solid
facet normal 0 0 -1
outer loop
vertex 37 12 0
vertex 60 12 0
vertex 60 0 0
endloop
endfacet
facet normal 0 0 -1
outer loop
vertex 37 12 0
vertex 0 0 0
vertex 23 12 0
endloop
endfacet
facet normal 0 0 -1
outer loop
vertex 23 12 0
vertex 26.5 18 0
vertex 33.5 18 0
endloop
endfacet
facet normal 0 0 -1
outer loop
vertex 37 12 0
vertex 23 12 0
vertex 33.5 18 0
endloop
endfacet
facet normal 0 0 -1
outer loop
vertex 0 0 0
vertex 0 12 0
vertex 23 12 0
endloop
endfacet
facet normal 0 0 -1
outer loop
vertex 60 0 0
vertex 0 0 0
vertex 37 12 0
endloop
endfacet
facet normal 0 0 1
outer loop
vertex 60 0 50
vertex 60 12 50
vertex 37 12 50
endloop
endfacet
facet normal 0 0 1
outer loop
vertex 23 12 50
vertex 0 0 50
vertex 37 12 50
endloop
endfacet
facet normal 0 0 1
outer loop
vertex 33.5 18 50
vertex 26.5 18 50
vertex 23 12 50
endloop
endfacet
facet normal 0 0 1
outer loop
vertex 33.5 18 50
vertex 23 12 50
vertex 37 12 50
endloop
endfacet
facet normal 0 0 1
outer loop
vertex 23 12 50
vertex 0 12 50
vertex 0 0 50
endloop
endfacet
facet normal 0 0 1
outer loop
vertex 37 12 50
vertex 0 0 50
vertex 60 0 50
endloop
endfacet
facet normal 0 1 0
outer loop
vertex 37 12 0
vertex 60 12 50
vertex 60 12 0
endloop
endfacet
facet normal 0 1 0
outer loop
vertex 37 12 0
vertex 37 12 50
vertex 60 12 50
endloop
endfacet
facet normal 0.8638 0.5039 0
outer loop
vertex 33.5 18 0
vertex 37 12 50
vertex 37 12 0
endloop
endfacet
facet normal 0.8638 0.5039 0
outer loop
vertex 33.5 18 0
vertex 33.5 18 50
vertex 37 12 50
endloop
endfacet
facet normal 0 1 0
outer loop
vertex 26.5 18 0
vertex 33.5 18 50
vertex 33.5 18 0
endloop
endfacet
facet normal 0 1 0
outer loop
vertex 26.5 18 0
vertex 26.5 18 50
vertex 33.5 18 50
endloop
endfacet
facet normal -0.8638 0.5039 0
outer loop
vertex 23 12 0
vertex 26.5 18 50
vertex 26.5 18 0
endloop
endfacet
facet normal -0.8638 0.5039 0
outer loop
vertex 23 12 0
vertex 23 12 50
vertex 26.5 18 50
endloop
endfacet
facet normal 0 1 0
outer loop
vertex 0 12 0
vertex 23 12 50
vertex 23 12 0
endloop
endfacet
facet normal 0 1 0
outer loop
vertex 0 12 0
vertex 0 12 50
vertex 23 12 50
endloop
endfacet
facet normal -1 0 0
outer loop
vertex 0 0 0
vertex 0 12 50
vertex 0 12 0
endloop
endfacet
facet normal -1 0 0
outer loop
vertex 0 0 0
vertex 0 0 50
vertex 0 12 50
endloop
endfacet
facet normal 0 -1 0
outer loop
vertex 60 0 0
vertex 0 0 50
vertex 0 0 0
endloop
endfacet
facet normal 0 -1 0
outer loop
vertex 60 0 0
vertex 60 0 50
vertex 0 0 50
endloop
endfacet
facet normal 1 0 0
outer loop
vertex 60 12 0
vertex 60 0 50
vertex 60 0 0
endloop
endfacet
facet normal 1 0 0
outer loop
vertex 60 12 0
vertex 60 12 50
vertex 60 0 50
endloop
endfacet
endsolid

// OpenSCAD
$fn = 32;

// ----------------------------------------------------------------------
// V guide rail: dovetail, 60 mm wide
// ----------------------------------------------------------------------

// --- parameters (mm) ---
rail_w = 60;              // rail width, X
base_t = 12;              // base plate thickness
v_depth = 6;              // V feature depth / height
v_half_w = 7;             // half width of the V at the base face
plate_t = 50;             // rail length, Z (the extrusion height)
top_half_w = 3.5;         // half width at the dovetail top

dovetail_base = 2 * v_half_w;  // dovetail width at the base
dovetail_top = 2 * top_half_w;  // dovetail width at the top

profile = [[0, 0], [60, 0], [60, 12], [37, 12], [33.5, 18], [26.5, 18], [23, 12], [0, 12]];  // primary outline, 8 points, counter clockwise

// --- the one profile operation ---
linear_extrude(height = plate_t) polygon(points = profile);
